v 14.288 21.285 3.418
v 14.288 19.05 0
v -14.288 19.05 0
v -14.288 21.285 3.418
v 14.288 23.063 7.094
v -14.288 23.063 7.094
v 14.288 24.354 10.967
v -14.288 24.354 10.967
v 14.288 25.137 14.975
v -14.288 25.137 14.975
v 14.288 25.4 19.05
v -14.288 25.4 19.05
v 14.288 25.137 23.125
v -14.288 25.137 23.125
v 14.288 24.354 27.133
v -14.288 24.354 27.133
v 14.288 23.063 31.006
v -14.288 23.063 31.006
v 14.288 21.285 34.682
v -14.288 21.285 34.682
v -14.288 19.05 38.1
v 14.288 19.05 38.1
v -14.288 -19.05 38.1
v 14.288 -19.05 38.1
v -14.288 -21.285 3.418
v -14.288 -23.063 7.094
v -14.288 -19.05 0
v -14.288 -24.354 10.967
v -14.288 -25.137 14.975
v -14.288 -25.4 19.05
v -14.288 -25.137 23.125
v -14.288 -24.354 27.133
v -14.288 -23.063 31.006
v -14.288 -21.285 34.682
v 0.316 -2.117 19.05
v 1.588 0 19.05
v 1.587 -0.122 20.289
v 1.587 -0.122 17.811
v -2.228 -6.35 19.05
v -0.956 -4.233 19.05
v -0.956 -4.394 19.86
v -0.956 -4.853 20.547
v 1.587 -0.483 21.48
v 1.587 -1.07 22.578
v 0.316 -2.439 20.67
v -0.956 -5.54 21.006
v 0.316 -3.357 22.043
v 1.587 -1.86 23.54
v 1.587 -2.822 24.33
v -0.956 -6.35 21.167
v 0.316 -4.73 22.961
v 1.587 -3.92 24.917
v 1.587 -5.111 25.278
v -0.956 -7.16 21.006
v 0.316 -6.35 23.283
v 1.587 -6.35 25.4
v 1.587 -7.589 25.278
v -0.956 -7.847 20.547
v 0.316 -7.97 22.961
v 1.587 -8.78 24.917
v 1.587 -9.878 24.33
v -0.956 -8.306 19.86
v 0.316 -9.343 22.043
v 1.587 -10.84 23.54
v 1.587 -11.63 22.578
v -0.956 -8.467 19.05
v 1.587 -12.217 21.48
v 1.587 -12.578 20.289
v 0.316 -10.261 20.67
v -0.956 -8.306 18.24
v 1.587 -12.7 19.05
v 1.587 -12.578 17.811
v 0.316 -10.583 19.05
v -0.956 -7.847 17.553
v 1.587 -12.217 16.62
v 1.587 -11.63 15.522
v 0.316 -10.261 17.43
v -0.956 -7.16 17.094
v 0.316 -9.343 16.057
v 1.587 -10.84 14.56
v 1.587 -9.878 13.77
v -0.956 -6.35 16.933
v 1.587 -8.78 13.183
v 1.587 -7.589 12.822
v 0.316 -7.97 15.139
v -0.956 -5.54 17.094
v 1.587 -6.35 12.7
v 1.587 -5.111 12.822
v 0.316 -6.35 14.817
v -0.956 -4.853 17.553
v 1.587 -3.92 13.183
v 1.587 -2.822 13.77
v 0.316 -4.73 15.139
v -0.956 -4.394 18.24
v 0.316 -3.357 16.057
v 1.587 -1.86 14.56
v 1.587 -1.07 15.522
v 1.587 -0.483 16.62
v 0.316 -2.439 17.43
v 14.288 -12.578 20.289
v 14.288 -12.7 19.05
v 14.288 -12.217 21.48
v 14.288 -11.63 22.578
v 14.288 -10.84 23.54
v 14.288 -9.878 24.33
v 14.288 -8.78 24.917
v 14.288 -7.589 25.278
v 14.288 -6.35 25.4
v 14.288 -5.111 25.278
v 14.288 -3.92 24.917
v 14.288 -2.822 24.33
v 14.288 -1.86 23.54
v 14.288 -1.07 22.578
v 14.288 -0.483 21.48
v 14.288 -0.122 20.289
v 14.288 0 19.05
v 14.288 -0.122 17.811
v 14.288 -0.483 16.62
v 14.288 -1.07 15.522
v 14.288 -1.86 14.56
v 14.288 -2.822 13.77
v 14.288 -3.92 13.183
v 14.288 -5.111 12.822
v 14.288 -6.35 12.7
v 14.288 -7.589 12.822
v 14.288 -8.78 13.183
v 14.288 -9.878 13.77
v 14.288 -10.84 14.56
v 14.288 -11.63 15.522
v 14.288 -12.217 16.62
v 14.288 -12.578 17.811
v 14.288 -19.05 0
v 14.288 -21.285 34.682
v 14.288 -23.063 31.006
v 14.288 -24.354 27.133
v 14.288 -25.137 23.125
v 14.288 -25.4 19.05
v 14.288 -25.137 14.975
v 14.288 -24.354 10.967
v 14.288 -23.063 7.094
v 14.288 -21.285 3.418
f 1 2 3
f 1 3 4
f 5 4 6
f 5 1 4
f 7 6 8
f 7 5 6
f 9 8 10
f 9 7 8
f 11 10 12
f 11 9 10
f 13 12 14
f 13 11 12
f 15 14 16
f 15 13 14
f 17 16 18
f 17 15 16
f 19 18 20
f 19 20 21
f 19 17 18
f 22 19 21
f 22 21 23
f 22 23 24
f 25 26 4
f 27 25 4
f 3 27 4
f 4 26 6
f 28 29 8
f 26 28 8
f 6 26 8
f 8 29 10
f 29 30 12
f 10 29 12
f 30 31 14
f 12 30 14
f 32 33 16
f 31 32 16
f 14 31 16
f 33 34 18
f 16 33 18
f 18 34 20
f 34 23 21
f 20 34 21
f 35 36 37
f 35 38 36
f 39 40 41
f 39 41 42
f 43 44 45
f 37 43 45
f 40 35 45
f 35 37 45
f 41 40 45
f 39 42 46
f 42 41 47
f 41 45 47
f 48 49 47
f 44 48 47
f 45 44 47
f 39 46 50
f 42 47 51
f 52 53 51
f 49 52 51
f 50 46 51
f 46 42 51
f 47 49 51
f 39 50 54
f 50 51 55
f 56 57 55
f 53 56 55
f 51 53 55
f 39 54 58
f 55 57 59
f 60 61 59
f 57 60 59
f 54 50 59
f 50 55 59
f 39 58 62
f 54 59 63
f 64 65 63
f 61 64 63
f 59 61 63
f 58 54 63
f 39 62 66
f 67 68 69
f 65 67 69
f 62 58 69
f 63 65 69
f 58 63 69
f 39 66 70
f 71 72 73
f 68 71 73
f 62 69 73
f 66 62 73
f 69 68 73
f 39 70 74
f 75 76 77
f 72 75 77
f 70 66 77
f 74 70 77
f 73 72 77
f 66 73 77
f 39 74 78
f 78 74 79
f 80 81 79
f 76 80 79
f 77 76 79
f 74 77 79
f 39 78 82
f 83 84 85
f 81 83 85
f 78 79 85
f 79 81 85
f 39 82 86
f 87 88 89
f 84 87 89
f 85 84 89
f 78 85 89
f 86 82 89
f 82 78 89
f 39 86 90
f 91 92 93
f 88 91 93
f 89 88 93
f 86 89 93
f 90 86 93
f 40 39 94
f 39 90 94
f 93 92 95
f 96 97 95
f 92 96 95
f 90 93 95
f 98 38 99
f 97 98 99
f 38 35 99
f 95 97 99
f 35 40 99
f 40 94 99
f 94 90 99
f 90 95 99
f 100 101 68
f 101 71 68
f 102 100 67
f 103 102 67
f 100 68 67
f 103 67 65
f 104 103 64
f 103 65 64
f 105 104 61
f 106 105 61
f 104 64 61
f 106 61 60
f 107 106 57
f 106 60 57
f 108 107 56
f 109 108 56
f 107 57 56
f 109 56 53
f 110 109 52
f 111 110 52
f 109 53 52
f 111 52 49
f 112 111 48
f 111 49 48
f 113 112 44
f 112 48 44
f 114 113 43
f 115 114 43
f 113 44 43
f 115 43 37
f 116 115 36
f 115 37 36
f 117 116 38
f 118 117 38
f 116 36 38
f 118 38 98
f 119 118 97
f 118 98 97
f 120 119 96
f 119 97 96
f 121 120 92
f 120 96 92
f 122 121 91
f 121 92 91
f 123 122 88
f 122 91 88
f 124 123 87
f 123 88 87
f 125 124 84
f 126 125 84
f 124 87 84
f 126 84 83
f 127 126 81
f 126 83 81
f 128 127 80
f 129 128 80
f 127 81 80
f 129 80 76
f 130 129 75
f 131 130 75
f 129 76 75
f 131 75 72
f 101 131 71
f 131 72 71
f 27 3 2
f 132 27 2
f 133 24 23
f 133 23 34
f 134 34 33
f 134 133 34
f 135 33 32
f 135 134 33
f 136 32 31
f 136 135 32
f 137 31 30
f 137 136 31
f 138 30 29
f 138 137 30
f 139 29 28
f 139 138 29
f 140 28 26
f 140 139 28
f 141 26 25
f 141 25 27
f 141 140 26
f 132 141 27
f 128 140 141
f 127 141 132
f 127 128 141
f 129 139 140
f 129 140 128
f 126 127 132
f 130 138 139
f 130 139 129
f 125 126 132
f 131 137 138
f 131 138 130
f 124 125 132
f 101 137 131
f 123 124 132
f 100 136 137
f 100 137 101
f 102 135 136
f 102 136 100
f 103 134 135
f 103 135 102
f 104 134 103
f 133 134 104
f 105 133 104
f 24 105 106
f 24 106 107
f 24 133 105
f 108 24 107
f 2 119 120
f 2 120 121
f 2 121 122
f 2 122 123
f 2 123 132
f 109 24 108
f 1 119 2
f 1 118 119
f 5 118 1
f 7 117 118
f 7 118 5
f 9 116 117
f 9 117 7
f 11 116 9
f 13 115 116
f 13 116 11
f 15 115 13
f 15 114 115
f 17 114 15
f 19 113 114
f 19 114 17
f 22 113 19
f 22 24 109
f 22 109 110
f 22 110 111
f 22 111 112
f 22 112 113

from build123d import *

# Parameters (mm, degrees)
F0_W     = 28.575
F0_H     = 38.1
F1_DEPTH = 38.1
F3_DEPTH = 28.575
F4_D     = 12.7
F4_DEPTH = 12.7
F4_TIP   = 3.8154649308


with BuildPart() as f1:
    # F0 (on Top) → F1 (new body)
    with BuildSketch(Plane.XY):
        Rectangle(F0_W, F0_H)
    extrude(amount=F1_DEPTH)

    # F2 (on face) → F3 (join, through all)
    with BuildSketch(Plane.YZ.offset(14.2875)):
        with BuildLine():
            ThreePointArc((-19.05, 38.1), (-25.4, 19.05), (-19.05, 0))
            Line((-19.05, 0), (-19.05, 38.1))
        make_face()
        with BuildLine():
            Line((19.05, 38.1), (19.05, 0))
            ThreePointArc((19.05, 0), (25.4, 19.05), (19.05, 38.1))
        make_face()
    extrude(amount=-F3_DEPTH)

    # F4
    with Locations(Plane.YZ.offset(14.2875)):
        with Locations((-6.35, 19.05)):
            Hole(F4_D / 2, depth=F4_DEPTH)
            with Locations((0, 0, -(F4_DEPTH + F4_TIP / 2))):  # 118° drill point
                Cone(0, F4_D / 2, F4_TIP, mode=Mode.SUBTRACT)


solid = f1.part
